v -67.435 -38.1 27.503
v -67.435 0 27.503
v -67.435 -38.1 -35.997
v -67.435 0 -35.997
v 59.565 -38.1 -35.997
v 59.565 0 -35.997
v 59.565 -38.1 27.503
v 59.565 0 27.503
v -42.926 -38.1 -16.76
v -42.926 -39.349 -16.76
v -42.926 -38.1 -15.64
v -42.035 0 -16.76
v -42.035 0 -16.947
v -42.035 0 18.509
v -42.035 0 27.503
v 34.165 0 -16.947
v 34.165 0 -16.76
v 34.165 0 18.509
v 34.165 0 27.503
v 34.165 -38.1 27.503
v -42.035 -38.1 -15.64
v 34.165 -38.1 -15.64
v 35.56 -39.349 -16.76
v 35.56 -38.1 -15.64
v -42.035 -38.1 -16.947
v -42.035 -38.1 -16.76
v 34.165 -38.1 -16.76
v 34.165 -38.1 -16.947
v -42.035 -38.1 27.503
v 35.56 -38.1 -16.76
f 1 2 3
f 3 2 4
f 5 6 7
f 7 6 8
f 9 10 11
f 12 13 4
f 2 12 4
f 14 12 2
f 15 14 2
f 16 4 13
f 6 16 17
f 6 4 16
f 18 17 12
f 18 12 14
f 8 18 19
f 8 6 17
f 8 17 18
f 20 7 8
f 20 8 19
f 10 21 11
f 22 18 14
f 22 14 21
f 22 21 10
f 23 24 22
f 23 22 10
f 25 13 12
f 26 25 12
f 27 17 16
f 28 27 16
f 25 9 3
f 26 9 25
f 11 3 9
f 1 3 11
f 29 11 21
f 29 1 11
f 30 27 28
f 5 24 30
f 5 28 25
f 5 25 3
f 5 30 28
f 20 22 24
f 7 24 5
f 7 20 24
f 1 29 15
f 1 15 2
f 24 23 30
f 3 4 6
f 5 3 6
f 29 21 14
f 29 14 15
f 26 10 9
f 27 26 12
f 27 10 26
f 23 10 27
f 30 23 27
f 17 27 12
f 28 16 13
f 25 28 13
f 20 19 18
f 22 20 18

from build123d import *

# Parameters (mm, degrees)
F1_DEPTH      = 38.1
F3_DEPTH      = 35.56
F3_DEPTH_BACK = 42.926


with BuildPart() as f1:
    # F0 (on Front) → F1 (new body)
    with BuildSketch(Plane.XZ):
        Polygon((-67.434916, 27.502788), (-67.434916, -35.997212), (59.565084, -35.997212), (59.565084, 27.502788), (34.165084, 27.502788), (34.165084, -16.947212), (-42.034916, -16.947212), (-42.034916, 27.502788), align=None)
    extrude(amount=F1_DEPTH)

    # F2 (on Right) → F3 (join, two sides)
    with BuildSketch(Plane.YZ) as f3_sk:
        Polygon((0, 18.508689), (-39.34918, -16.759835), (0, -16.759835), align=None)
    extrude(amount=F3_DEPTH)
    extrude(f3_sk.sketch, amount=-F3_DEPTH_BACK)


solid = f1.part
